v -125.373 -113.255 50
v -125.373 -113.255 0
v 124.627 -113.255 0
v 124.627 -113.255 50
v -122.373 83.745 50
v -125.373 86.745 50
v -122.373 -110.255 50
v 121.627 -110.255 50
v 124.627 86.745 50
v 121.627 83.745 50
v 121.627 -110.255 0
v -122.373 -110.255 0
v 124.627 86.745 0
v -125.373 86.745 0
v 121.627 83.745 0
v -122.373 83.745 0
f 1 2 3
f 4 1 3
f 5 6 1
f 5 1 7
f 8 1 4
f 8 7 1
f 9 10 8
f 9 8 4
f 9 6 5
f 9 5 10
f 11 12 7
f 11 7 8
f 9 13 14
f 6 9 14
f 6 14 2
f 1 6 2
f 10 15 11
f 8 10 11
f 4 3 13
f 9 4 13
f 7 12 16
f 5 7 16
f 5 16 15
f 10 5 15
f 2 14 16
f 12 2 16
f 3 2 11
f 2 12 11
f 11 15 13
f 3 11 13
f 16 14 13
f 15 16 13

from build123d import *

# Parameters (mm, degrees)
F0_W     = 3
F0_H     = 97
F0_H_2   = 3
F0_W_2   = 122
F0_W_3   = 115.3171807528
F0_W_4   = 6.6828192472
F0_W_5   = 244
F1_DEPTH = 50


with BuildPart() as f1:
    # F0 (on Top) → F1 (new body)
    with BuildSketch(Plane.XY):
        with Locations((-123.8728196025, 35.2448651371)):
            Rectangle(F0_W, F0_H)
        with Locations((-123.8728196025, 85.2448651371)):
            Rectangle(F0_W, F0_H_2)
        with Locations((-61.3728196025, 85.2448651371)):
            Rectangle(F0_W_2, F0_H_2)
        with Locations((57.2857707739, 85.2448651371)):
            Rectangle(F0_W_3, F0_H_2)
        with Locations((118.2857707739, 85.2448651371)):
            Rectangle(F0_W_4, F0_H_2)
        with Locations((123.1271803975, 85.2448651371)):
            Rectangle(F0_W, F0_H_2)
        Polygon((124.6271803975, 83.7448651371), (121.6271803975, 83.7448651371), (121.6271803975, -110.2551348629), (121.6271803975, -113.2551348629), (124.6271803975, -113.2551348629), align=None)
        with Locations((-0.3728196025, -111.7551348629)):
            Rectangle(F0_W_5, F0_H_2)
        with Locations((-123.8728196025, -61.7551348629)):
            Rectangle(F0_W, F0_H)
        with Locations((-123.8728196025, -111.7551348629)):
            Rectangle(F0_W, F0_H_2)
    extrude(amount=F1_DEPTH)


solid = f1.part
